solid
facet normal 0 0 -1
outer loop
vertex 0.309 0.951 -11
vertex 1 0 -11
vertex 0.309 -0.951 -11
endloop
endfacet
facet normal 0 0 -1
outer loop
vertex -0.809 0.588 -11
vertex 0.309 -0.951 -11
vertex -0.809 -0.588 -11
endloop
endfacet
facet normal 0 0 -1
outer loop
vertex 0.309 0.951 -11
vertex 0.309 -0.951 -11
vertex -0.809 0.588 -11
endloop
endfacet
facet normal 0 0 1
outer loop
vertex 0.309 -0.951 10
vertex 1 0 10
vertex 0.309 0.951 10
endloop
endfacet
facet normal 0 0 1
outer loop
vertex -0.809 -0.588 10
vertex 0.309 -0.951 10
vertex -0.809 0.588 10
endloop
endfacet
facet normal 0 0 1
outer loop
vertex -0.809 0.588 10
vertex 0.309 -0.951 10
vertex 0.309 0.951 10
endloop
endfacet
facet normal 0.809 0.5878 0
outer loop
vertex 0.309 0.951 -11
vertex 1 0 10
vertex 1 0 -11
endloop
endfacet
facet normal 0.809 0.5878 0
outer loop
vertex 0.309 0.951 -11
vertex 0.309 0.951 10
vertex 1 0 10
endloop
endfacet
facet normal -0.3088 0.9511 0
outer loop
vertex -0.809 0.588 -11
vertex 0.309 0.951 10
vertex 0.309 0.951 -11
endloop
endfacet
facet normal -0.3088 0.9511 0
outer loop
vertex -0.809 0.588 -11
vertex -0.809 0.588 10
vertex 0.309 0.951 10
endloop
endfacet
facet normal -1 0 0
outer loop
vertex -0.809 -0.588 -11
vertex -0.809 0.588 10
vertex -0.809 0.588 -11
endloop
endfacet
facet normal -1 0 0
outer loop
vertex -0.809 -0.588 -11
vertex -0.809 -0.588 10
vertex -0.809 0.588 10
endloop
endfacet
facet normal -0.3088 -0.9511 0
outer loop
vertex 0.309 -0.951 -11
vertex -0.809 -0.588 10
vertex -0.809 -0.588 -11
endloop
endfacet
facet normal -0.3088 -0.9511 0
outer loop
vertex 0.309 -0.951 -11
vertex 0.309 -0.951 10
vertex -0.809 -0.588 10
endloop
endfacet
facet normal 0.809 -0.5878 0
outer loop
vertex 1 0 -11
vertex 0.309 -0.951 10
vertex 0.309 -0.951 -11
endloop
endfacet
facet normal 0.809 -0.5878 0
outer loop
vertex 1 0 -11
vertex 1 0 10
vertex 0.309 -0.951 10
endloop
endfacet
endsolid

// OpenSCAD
// Unit of length: Unit.MM
translate(v = [0.0, 0.0, -11.0])
{
   linear_extrude(height = 21.0, center = false, twist = 0.0, scale = 1.0)
   {
      circle(d = 2.0);
   }
}
